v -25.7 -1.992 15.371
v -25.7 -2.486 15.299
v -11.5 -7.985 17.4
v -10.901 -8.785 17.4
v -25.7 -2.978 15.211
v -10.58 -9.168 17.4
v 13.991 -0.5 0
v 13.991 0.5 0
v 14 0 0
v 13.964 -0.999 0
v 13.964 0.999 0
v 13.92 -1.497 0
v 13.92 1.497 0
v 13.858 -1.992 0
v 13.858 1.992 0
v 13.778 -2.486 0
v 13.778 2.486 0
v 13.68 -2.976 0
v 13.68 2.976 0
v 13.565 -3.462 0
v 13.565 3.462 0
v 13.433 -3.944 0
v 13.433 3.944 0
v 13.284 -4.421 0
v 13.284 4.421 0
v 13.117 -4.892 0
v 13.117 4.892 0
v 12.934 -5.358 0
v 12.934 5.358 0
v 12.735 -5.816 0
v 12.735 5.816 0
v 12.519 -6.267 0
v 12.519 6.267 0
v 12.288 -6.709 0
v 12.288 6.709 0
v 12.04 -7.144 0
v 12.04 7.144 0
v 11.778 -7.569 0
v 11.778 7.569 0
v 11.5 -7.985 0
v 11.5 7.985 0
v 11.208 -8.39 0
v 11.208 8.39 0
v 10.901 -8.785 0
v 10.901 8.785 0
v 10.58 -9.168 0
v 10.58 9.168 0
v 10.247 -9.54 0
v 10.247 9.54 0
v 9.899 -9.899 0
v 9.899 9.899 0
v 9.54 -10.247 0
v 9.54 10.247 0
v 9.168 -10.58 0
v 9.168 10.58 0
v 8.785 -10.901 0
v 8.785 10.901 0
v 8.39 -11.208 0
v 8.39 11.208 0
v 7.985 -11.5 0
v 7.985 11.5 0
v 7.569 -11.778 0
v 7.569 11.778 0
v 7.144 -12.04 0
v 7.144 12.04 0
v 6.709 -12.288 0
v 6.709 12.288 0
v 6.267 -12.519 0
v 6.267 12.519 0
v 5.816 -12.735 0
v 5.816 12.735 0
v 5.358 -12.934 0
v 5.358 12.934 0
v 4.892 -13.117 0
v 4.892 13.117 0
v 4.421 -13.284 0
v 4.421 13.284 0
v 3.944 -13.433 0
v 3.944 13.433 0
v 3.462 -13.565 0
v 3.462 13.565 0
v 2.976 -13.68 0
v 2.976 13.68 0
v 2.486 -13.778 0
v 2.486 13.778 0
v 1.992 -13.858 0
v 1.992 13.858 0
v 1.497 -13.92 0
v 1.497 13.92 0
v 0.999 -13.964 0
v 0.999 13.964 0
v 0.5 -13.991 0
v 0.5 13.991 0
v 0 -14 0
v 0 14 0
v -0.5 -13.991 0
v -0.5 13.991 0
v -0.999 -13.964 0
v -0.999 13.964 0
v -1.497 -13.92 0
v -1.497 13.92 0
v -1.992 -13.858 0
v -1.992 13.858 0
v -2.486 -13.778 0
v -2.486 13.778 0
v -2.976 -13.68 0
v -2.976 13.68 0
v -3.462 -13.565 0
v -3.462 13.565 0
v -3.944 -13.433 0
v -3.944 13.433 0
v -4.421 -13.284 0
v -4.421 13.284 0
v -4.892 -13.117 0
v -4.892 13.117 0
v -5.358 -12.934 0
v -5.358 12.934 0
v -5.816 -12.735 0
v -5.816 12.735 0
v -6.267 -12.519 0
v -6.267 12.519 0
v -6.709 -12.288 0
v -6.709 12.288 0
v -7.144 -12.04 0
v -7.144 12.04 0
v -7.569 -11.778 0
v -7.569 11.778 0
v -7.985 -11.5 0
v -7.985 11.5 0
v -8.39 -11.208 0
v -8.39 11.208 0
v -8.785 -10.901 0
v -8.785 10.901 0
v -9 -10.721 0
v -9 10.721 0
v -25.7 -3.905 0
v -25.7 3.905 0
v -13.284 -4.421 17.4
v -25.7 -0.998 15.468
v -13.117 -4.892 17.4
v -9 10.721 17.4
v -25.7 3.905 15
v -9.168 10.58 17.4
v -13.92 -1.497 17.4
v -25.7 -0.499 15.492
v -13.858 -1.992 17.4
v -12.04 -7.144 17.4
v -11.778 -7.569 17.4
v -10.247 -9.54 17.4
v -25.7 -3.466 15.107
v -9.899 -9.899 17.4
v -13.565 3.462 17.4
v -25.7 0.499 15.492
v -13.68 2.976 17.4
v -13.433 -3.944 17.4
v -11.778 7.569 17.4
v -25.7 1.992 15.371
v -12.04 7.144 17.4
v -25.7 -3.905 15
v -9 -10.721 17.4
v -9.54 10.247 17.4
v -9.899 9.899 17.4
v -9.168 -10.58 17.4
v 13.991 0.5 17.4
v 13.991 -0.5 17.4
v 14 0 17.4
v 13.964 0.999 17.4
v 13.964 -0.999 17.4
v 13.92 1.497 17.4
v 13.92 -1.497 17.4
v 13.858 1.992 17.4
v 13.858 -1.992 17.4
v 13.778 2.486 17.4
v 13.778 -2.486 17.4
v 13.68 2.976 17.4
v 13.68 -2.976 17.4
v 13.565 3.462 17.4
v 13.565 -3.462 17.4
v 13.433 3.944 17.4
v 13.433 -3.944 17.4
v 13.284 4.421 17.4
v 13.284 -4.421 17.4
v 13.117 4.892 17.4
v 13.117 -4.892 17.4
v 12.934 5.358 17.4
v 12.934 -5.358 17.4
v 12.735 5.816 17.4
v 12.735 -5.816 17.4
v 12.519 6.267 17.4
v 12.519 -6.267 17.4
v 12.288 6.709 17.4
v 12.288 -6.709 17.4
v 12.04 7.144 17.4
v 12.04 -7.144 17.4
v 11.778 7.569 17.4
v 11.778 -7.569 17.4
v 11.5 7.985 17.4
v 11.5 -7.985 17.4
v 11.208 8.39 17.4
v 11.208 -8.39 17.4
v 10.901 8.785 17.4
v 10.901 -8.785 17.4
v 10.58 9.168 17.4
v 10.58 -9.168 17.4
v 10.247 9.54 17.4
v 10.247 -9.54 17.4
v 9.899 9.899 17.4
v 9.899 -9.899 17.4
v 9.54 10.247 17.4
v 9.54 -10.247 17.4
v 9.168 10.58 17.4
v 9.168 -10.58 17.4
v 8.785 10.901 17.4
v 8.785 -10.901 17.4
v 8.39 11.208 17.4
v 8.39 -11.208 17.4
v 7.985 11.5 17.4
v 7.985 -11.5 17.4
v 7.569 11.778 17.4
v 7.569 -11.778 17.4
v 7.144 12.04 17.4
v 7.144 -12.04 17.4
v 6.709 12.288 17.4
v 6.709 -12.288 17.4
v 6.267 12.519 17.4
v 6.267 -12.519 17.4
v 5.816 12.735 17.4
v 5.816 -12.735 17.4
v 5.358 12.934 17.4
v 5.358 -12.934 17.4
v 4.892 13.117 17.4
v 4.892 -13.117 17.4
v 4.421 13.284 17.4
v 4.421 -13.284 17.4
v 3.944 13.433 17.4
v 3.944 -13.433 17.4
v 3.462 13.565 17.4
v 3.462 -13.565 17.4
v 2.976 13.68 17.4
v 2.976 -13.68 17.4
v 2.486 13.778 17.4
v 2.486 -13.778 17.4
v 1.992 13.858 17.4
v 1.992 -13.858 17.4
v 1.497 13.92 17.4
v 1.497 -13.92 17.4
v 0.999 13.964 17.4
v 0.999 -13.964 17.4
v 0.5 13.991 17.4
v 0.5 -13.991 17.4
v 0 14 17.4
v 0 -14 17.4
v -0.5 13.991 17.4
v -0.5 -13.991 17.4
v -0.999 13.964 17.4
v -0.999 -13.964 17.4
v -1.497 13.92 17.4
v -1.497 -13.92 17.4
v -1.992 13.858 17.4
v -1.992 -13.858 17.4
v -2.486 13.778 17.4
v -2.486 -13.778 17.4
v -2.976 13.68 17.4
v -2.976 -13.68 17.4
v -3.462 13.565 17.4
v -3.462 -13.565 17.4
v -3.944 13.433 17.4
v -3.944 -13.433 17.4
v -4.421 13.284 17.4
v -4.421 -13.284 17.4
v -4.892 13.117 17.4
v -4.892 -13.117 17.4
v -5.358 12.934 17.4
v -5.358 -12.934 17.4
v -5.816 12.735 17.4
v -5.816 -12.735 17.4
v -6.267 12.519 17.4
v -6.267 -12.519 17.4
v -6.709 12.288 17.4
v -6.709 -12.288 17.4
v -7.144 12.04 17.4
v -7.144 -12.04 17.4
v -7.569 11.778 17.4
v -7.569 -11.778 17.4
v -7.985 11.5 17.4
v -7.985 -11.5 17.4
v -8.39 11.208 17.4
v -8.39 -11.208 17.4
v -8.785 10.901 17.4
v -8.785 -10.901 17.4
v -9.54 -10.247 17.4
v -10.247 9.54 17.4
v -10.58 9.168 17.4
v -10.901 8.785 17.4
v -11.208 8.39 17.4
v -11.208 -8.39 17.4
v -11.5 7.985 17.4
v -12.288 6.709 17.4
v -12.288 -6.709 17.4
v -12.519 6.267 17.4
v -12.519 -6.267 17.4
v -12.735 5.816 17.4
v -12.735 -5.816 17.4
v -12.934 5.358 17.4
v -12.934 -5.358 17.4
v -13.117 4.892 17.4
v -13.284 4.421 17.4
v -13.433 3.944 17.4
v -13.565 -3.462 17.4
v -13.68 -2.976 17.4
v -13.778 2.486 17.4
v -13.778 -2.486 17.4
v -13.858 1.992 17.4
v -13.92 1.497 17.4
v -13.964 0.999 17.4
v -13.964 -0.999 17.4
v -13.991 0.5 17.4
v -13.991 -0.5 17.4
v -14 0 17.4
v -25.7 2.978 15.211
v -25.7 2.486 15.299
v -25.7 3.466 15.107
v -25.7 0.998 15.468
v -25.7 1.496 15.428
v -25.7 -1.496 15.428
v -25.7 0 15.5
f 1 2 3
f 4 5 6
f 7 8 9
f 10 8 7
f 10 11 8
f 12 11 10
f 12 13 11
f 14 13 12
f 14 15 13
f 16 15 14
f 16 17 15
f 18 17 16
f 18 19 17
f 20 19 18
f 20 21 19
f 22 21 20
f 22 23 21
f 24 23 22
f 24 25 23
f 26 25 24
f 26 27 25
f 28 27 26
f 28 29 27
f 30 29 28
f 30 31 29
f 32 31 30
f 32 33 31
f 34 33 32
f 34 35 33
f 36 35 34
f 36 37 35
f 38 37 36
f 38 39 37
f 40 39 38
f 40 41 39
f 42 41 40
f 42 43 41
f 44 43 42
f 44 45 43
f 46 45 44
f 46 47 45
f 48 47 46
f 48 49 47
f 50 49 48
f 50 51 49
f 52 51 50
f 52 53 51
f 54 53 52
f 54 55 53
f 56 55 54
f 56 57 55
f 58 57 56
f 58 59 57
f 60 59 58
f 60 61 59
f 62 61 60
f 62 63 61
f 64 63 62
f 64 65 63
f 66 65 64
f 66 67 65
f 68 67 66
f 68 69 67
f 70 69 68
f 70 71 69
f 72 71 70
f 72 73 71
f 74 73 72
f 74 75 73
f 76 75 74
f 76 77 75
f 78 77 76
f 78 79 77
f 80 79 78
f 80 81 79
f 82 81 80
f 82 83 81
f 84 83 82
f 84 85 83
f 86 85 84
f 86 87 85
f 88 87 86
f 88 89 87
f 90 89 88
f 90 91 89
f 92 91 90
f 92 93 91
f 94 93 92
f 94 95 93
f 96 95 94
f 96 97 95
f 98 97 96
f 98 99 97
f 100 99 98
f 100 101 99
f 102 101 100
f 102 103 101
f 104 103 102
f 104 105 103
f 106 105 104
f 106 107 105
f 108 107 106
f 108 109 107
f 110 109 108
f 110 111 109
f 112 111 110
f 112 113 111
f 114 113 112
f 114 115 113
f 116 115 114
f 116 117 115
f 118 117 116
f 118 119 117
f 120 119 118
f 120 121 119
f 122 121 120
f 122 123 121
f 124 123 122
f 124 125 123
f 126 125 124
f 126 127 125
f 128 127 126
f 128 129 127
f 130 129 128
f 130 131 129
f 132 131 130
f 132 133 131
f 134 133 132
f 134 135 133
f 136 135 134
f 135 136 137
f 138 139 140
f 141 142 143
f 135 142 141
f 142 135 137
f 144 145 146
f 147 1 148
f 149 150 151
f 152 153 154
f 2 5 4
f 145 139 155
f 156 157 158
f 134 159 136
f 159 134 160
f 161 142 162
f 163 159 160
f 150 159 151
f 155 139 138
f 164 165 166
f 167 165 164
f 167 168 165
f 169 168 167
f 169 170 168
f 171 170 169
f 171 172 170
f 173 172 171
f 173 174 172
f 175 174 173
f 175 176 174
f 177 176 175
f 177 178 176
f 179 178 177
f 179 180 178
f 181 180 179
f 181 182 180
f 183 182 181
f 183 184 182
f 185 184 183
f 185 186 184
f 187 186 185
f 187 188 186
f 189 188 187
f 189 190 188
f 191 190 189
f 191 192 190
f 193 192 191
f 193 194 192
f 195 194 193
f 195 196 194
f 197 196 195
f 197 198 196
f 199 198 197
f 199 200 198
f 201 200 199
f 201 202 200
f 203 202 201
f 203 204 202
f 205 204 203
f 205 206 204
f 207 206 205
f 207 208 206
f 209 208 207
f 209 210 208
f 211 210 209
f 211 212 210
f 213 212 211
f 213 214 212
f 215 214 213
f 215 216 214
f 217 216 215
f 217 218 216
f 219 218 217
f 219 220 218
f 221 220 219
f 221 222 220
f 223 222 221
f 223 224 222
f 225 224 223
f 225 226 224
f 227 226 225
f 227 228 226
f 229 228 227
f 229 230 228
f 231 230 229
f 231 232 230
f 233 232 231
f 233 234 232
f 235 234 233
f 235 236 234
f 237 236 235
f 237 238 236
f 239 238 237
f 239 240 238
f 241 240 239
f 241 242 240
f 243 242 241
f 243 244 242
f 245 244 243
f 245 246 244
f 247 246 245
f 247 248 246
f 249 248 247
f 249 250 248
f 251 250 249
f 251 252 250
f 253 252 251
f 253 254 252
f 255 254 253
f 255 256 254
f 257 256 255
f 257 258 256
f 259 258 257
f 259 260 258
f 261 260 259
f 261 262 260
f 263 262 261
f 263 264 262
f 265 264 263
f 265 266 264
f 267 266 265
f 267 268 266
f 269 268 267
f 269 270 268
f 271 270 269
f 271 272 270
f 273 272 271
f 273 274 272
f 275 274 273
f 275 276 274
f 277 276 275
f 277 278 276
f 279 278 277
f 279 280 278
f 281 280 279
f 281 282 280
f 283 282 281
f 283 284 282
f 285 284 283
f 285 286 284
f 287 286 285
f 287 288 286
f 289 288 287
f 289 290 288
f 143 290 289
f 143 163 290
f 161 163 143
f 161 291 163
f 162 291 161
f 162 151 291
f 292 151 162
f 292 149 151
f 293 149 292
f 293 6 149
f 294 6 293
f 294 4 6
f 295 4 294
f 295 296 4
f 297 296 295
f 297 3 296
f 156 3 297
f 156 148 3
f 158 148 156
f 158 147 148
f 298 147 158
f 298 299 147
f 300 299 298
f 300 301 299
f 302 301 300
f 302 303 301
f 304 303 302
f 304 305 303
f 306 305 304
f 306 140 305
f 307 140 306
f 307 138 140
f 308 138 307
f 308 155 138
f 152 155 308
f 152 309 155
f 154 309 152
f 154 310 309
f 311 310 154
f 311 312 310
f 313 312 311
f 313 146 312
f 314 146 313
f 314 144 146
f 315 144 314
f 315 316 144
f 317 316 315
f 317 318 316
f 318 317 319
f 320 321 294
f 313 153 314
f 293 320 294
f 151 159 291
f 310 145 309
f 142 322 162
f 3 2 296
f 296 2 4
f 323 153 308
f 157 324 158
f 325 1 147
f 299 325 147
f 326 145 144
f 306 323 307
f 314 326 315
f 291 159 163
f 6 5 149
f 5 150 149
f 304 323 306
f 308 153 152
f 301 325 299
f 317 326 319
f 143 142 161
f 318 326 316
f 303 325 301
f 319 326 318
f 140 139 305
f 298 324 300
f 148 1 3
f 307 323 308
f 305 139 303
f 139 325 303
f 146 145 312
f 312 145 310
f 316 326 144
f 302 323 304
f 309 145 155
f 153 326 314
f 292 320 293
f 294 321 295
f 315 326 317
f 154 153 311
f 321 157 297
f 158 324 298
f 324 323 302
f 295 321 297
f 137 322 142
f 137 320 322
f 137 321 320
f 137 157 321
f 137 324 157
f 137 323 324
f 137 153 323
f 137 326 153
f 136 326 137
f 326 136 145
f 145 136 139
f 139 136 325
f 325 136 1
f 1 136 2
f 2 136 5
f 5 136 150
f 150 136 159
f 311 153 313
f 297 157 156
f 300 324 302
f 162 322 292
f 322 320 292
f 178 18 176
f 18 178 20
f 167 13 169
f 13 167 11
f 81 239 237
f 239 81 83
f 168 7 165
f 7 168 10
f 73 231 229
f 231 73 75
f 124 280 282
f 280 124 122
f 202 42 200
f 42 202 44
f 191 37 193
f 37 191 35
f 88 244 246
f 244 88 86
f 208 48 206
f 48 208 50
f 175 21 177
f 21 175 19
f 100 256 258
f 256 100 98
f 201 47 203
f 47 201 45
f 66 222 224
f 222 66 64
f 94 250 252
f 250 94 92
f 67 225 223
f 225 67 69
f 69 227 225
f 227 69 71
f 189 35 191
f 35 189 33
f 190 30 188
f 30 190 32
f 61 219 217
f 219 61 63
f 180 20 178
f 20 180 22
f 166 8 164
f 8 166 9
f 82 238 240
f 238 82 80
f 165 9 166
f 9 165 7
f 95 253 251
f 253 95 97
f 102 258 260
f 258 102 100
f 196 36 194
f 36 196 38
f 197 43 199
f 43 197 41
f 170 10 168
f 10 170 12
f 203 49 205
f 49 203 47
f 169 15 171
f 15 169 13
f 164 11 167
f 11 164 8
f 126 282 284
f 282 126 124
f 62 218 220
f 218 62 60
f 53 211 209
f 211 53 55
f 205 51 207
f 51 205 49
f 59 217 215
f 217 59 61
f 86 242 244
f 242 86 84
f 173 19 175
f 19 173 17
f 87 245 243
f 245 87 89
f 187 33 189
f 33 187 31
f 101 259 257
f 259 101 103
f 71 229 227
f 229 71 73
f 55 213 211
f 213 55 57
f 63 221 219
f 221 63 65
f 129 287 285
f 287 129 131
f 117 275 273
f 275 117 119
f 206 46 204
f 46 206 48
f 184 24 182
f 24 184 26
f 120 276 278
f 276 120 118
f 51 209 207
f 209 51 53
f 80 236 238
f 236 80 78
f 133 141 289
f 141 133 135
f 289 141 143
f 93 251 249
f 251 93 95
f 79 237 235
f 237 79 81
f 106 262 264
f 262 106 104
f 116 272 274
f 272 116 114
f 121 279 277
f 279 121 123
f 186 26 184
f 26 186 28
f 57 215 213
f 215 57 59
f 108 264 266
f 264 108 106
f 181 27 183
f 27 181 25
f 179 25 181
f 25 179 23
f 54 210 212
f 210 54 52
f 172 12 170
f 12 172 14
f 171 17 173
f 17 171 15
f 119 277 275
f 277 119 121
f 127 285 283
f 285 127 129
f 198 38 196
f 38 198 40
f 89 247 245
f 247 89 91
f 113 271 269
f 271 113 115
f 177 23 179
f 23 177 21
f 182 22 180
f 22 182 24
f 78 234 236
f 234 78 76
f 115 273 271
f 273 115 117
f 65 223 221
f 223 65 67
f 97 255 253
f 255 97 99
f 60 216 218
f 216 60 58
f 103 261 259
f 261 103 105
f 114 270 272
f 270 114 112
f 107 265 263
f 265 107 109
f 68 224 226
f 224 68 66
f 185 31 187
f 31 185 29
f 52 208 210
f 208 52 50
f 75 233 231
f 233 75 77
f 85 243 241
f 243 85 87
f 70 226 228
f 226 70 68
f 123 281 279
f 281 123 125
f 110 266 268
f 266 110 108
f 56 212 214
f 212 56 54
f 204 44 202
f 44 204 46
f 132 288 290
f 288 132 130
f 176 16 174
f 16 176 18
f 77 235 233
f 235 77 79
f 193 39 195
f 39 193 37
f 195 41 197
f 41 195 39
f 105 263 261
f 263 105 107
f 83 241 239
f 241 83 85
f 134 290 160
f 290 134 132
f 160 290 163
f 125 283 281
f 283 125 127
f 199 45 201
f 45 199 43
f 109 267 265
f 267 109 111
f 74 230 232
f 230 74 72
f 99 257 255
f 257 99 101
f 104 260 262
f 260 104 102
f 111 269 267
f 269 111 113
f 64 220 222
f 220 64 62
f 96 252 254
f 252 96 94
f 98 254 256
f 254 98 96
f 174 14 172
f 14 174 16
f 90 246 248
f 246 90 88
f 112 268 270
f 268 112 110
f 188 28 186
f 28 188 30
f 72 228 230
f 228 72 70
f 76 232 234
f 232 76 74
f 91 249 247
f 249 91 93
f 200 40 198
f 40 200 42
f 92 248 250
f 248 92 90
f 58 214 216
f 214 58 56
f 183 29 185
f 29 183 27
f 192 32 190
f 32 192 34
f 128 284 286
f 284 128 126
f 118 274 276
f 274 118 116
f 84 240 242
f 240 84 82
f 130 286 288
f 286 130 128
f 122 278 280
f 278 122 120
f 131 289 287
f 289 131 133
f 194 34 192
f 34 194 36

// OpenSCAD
// file: metric.scad
// nuts
// nutMxW - width of nut, nutMxH - height of nut
// M2
nutM2W = 4.0+0.3;
nutM2H = 1.9+0.2;
nutM2D = nutM2W/cos(30);
// M3
nutM3W = 5.4+0.3;
nutM3H = 2.3+0.2;
nutM3D = nutM3W/cos(30);

// screws
// M2
screwM2D = 2+0.3;
screwM2HeadD = 3.8;
screwM2HeadH = 2.0;
// M3
screwM3D = 3+0.3;

// lm8uu
lm8uuD = 15+0.4; // Diameter of lm8uu
lm8uuL = 24.1; // Length of lm8uu

// E3Dv5

//fan
fanT = 10; //fanThickness
// file: config.scad
include <metric.scad>;


$fa=0.5;
$fs=0.5;

radiatorL=31.8; // Length of radiator
radiatorD=25; // Diameter of radiator
hotendNeckD=9;
fanHoleD = 28; //Diameter of fan hole

rodDst = 50; // Distance berween rods



//hotendFanHolderGap=0.1; // Distance between body & holder
centralGap=2; // Distance between two parts of body
wallThickness = 1.5;


// Spetial settings
carriageL=2*lm8uuL+wallThickness*2+centralGap;
hotendFanHolderH=radiatorD/2+5; // z size of hotend's fun holder WITHOUT gap
//hotendFanHolderH=carriageL/2-10; // z size of hotend's fun holder WITHOUT gap
hotendXtranslate=carriageL/2-hotendFanHolderH-10; // Radiator -> Fan distance = 5mm


nutM2 = [nutM2W,nutM2H,nutM2D];
nutM3 = [nutM3W,nutM3H,nutM3D];
fanScewL = 16;
fanHolderLugX=(radiatorL-nutM2D)/2;
fanHolderLugY=(50-lm8uuD)/2-nutM2W/2-wallThickness+0.5;
fanHolderLugDst=sqrt(pow(fanHolderLugX,2)+pow(fanHolderLugY,2)); // Distance from center of lug hole to center of fan hole
fanHolderLugAngle=atan(fanHolderLugY/fanHolderLugX); // I don't know how to describe this))

hh = 0;
//holderNutTranslate = sqrt(pow(lm8uuD/2+wallThickness,2)-pow((lm8uuD/2+wallThickness+hh)-nutM2W/2,2));
holderNutTranslate = sqrt(pow(lm8uuD/2,2)-pow((lm8uuD/2+hh)-nutM2W/2,2));
holderScrewTranslate = sqrt(pow(lm8uuD/2+wallThickness,2)-pow((lm8uuD/2+wallThickness+hh)-screwM2HeadD/2,2));
//holderScrewTranslate = sqrt(pow(lm8uuD/2,2)-pow((lm8uuD/2+hh)-screwM2HeadD/2,2));

gt2PlateL=15;
gt2PlateTh=2*wallThickness;
// main file
include <config.scad>

module bodyBevel1() {
  hull() {
    difference() {
      cylinder(d=radiatorD+2*wallThickness,h=5+5);
      translate([-10,-(radiatorD+2*wallThickness)/2-1,-1])
        cube([radiatorD+2*wallThickness+2,radiatorD+2*wallThickness+2,5+5+2]);
    }
    translate([-20,-0.1/2,0])
      cube([0.1,0.1,5]);
  }
}

module bodyBevel2(L=radiatorL/2+wallThickness, // Total length
                     d1=radiatorD+2*wallThickness,
                     d2=fanHoleD+2*wallThickness,
                     h1=radiatorL/2+wallThickness-(fanHoleD+2*wallThickness)/2,
                     h2=carriageL/2+hotendXtranslate-(radiatorD+2*wallThickness)/2,
                     d1Lip=5,
                     d2Lip=0.5) {
 translate([-(d1/2-d1Lip),0,L-h1-d2Lip])
 hull() {
    difference() {
      translate([d1/2-d1Lip,0,-L+h1+d2Lip])
        //cylinder(d=d1,h=h1+d2Lip);
        cylinder(d=d1,h=L);
      translate([0,-(d2+2)/2,-L+h1+d2Lip-1])
        cube([d1+1,d2+2,L+2]);
    }
    union() {
      difference() {
        translate([0,0,-d2/2+d2Lip])
          rotate([0,-90,0])
            cylinder(d=d2, h=h2+d1Lip);
        translate([-(h2+d1Lip+1)+0.5,-(d2+2)/2-1,-(d2-d2Lip+1)])
          cube([h2+d1Lip+1,d2+2,d2-d2Lip+1]);
      }
      translate([-(h2+d1Lip),-sqrt(pow(d2/2,2)-pow(d2/2-d2Lip,2)),-(L-h1-d2Lip)])
      cube([h2+d1Lip,2*sqrt(pow(d2/2,2)-pow(d2/2-d2Lip,2)),L-h1-d2Lip]);
    }
 }
}

bodyBevel2();
cylinder(d=radiatorD+2*wallThickness,h=radiatorL/2+wallThickness);
